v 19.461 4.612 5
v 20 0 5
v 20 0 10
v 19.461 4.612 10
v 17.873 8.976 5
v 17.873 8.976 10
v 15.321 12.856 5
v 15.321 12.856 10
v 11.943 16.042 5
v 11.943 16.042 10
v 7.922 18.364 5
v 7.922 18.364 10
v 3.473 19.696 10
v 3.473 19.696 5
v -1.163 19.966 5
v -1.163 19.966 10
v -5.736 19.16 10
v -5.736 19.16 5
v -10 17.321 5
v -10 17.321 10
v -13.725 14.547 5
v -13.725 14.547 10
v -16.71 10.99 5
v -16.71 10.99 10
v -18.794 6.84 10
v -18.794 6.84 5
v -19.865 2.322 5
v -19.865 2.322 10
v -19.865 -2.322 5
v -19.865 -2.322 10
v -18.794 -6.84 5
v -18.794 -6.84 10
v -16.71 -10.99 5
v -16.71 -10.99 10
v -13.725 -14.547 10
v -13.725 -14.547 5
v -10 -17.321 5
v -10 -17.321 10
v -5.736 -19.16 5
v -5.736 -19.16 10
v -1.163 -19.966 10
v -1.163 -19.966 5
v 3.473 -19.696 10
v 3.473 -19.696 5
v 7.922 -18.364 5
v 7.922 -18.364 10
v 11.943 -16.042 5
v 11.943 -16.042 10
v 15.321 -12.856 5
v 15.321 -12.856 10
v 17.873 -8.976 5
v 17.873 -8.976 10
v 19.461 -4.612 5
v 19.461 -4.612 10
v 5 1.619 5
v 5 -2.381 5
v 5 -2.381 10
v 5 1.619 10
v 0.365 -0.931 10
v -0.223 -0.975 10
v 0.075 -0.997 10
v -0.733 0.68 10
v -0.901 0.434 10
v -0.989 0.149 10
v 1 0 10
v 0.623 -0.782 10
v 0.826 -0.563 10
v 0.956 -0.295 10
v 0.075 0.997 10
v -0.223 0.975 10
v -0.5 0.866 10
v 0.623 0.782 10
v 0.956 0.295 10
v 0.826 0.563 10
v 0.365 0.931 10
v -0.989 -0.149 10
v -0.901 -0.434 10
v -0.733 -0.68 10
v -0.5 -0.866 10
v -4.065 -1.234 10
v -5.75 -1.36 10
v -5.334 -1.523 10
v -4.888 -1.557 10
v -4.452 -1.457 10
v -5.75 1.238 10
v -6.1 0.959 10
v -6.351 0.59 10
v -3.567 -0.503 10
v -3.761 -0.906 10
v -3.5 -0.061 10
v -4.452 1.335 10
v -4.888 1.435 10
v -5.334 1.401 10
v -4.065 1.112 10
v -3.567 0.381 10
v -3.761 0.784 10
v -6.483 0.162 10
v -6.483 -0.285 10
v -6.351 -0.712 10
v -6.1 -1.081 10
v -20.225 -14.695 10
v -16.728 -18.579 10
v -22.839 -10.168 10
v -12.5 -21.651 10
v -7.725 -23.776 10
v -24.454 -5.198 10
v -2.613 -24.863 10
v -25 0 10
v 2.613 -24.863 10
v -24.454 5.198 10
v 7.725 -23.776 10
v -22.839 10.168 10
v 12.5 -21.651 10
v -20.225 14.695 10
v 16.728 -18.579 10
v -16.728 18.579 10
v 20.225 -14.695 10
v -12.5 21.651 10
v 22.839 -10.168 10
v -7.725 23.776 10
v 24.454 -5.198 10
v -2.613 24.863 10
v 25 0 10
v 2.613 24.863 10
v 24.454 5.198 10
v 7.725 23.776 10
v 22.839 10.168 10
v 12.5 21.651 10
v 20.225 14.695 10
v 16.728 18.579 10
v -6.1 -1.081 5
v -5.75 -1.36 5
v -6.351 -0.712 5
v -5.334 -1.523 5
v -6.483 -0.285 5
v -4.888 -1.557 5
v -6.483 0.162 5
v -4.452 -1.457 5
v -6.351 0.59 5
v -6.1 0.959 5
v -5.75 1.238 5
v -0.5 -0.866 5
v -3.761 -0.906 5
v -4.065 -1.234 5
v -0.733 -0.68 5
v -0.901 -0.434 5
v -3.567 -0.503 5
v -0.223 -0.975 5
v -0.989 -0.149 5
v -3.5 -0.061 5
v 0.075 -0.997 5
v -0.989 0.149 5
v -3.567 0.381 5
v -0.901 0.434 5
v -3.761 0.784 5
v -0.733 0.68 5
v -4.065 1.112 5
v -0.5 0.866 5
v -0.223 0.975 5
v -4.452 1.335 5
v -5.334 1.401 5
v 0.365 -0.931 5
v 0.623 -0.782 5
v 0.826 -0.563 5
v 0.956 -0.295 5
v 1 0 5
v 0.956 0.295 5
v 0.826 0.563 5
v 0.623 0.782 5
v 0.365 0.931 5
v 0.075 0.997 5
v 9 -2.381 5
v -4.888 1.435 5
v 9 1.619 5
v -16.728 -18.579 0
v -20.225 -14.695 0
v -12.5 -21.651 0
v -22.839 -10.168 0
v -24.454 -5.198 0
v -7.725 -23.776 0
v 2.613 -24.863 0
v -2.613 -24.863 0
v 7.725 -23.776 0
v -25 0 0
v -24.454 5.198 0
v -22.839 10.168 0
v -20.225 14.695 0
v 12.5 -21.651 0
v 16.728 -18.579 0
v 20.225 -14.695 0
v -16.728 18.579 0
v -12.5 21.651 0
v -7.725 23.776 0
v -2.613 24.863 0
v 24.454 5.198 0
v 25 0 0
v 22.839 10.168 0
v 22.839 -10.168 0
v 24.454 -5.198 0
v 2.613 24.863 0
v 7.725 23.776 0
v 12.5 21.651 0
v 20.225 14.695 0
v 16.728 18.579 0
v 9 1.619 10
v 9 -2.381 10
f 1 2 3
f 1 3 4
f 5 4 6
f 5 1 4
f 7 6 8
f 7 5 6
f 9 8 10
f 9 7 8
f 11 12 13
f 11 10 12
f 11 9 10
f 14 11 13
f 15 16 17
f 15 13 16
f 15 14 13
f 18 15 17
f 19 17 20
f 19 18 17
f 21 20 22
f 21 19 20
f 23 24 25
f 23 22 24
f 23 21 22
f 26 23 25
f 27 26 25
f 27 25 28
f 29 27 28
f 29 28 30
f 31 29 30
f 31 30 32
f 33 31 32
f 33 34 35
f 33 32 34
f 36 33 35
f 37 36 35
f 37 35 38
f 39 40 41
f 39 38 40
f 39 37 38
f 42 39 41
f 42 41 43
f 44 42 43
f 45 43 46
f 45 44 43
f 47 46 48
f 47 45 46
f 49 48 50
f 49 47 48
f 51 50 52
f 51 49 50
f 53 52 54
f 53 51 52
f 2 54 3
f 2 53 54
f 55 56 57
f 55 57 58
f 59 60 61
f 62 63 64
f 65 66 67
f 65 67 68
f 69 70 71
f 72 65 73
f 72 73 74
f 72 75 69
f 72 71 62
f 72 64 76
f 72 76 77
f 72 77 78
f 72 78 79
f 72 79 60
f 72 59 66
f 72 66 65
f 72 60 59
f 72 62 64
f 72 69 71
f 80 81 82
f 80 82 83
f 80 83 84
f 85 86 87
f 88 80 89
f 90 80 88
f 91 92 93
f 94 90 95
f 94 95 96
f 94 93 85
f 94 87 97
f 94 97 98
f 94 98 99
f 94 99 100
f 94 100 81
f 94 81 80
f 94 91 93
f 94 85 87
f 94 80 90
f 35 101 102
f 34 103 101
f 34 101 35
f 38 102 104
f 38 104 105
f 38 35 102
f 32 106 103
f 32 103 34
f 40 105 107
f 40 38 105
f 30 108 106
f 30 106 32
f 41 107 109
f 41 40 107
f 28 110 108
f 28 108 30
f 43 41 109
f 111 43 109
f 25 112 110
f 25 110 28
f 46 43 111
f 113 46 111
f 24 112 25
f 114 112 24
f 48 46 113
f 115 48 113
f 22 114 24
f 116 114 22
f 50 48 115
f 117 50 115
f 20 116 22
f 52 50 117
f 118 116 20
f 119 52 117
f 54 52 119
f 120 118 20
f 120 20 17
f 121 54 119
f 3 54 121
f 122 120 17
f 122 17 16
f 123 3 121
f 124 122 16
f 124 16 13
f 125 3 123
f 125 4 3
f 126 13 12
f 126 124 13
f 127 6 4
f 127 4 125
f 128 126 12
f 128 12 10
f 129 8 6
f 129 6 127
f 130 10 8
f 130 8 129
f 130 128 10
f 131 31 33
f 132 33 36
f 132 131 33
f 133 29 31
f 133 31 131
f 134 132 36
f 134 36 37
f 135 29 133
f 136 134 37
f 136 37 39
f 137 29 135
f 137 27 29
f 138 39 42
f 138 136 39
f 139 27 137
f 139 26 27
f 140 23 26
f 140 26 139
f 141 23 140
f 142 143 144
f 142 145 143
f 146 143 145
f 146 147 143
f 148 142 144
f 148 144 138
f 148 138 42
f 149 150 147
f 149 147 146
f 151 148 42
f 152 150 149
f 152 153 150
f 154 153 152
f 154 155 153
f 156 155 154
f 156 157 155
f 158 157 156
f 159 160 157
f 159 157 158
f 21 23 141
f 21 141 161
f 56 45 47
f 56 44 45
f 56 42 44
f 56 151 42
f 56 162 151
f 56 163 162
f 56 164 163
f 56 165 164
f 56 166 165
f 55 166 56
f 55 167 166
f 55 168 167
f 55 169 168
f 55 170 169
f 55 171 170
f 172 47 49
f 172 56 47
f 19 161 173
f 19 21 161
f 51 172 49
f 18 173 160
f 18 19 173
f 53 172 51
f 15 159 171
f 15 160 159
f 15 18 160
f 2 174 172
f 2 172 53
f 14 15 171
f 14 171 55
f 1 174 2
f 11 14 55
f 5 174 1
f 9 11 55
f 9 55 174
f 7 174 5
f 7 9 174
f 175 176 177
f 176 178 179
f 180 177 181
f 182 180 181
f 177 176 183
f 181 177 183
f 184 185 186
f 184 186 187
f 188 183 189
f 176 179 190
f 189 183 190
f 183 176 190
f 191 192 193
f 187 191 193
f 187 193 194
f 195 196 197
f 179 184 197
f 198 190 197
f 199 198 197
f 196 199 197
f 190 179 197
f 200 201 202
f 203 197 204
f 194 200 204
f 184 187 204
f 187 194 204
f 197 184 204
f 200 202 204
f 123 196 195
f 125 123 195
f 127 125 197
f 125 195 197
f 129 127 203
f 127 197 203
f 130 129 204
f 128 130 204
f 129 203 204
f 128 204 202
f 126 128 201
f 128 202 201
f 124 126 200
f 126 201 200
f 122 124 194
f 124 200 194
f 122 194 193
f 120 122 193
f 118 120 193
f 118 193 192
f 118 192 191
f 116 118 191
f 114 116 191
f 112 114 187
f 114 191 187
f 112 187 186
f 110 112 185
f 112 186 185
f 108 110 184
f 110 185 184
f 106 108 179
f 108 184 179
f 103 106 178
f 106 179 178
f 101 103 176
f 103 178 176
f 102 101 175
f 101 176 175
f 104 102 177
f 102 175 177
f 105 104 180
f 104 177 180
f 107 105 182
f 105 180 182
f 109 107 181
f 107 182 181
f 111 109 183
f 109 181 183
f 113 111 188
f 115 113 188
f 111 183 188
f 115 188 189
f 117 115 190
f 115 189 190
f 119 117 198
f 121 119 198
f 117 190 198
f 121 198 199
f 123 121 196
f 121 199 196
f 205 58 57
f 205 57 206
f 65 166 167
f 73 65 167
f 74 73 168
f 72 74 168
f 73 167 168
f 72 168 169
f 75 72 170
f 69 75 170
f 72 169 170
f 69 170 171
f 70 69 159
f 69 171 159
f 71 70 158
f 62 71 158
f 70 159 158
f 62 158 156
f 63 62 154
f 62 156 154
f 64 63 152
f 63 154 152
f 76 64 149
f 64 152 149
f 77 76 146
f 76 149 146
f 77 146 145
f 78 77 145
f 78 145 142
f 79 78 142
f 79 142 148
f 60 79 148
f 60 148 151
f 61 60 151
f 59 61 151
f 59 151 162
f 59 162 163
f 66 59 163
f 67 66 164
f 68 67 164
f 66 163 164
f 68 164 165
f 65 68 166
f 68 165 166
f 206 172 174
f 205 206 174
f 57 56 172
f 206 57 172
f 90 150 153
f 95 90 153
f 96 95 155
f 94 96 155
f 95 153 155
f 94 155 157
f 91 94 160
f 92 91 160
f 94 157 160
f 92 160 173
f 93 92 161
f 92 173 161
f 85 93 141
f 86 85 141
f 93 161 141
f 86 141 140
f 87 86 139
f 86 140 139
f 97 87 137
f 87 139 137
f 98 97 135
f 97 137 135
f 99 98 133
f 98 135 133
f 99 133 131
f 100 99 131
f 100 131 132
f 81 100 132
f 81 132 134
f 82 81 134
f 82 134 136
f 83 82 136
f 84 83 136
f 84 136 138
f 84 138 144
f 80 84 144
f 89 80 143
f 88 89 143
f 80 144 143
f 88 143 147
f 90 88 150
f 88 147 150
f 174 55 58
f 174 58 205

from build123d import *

# Parameters (mm, degrees)
SKETCH1_R           = 25
BOSS_EXTRUDE1_DEPTH = 10
SHELL3_T            = -5
SKETCH3_R           = 1.5
SKETCH3_R_2         = 1
SKETCH3_W           = 4
SKETCH3_H           = 4
BOSS_EXTRUDE2_DEPTH = 5


with BuildPart() as part:
    # Sketch1 → Boss-Extrude1 (new body)
    with BuildSketch(Plane.XY):
        Circle(SKETCH1_R)
    extrude(amount=BOSS_EXTRUDE1_DEPTH)

    # Shell3
    shell3_openings = [part.faces().sort_by_distance(p)[0] for p in [
        (0, 0, 10),
    ]]
    offset(amount=SHELL3_T, openings=shell3_openings, kind=Kind.INTERSECTION)

    # Sketch3 → Boss-Extrude2 (add)
    with BuildSketch(Plane.XY.offset(5)):
        with Locations((-5, -0.061087675)):
            Circle(SKETCH3_R)
        Circle(SKETCH3_R_2)
        with Locations((7, -0.381193265)):
            Rectangle(SKETCH3_W, SKETCH3_H)
    extrude(amount=BOSS_EXTRUDE2_DEPTH)


solid = part.part
